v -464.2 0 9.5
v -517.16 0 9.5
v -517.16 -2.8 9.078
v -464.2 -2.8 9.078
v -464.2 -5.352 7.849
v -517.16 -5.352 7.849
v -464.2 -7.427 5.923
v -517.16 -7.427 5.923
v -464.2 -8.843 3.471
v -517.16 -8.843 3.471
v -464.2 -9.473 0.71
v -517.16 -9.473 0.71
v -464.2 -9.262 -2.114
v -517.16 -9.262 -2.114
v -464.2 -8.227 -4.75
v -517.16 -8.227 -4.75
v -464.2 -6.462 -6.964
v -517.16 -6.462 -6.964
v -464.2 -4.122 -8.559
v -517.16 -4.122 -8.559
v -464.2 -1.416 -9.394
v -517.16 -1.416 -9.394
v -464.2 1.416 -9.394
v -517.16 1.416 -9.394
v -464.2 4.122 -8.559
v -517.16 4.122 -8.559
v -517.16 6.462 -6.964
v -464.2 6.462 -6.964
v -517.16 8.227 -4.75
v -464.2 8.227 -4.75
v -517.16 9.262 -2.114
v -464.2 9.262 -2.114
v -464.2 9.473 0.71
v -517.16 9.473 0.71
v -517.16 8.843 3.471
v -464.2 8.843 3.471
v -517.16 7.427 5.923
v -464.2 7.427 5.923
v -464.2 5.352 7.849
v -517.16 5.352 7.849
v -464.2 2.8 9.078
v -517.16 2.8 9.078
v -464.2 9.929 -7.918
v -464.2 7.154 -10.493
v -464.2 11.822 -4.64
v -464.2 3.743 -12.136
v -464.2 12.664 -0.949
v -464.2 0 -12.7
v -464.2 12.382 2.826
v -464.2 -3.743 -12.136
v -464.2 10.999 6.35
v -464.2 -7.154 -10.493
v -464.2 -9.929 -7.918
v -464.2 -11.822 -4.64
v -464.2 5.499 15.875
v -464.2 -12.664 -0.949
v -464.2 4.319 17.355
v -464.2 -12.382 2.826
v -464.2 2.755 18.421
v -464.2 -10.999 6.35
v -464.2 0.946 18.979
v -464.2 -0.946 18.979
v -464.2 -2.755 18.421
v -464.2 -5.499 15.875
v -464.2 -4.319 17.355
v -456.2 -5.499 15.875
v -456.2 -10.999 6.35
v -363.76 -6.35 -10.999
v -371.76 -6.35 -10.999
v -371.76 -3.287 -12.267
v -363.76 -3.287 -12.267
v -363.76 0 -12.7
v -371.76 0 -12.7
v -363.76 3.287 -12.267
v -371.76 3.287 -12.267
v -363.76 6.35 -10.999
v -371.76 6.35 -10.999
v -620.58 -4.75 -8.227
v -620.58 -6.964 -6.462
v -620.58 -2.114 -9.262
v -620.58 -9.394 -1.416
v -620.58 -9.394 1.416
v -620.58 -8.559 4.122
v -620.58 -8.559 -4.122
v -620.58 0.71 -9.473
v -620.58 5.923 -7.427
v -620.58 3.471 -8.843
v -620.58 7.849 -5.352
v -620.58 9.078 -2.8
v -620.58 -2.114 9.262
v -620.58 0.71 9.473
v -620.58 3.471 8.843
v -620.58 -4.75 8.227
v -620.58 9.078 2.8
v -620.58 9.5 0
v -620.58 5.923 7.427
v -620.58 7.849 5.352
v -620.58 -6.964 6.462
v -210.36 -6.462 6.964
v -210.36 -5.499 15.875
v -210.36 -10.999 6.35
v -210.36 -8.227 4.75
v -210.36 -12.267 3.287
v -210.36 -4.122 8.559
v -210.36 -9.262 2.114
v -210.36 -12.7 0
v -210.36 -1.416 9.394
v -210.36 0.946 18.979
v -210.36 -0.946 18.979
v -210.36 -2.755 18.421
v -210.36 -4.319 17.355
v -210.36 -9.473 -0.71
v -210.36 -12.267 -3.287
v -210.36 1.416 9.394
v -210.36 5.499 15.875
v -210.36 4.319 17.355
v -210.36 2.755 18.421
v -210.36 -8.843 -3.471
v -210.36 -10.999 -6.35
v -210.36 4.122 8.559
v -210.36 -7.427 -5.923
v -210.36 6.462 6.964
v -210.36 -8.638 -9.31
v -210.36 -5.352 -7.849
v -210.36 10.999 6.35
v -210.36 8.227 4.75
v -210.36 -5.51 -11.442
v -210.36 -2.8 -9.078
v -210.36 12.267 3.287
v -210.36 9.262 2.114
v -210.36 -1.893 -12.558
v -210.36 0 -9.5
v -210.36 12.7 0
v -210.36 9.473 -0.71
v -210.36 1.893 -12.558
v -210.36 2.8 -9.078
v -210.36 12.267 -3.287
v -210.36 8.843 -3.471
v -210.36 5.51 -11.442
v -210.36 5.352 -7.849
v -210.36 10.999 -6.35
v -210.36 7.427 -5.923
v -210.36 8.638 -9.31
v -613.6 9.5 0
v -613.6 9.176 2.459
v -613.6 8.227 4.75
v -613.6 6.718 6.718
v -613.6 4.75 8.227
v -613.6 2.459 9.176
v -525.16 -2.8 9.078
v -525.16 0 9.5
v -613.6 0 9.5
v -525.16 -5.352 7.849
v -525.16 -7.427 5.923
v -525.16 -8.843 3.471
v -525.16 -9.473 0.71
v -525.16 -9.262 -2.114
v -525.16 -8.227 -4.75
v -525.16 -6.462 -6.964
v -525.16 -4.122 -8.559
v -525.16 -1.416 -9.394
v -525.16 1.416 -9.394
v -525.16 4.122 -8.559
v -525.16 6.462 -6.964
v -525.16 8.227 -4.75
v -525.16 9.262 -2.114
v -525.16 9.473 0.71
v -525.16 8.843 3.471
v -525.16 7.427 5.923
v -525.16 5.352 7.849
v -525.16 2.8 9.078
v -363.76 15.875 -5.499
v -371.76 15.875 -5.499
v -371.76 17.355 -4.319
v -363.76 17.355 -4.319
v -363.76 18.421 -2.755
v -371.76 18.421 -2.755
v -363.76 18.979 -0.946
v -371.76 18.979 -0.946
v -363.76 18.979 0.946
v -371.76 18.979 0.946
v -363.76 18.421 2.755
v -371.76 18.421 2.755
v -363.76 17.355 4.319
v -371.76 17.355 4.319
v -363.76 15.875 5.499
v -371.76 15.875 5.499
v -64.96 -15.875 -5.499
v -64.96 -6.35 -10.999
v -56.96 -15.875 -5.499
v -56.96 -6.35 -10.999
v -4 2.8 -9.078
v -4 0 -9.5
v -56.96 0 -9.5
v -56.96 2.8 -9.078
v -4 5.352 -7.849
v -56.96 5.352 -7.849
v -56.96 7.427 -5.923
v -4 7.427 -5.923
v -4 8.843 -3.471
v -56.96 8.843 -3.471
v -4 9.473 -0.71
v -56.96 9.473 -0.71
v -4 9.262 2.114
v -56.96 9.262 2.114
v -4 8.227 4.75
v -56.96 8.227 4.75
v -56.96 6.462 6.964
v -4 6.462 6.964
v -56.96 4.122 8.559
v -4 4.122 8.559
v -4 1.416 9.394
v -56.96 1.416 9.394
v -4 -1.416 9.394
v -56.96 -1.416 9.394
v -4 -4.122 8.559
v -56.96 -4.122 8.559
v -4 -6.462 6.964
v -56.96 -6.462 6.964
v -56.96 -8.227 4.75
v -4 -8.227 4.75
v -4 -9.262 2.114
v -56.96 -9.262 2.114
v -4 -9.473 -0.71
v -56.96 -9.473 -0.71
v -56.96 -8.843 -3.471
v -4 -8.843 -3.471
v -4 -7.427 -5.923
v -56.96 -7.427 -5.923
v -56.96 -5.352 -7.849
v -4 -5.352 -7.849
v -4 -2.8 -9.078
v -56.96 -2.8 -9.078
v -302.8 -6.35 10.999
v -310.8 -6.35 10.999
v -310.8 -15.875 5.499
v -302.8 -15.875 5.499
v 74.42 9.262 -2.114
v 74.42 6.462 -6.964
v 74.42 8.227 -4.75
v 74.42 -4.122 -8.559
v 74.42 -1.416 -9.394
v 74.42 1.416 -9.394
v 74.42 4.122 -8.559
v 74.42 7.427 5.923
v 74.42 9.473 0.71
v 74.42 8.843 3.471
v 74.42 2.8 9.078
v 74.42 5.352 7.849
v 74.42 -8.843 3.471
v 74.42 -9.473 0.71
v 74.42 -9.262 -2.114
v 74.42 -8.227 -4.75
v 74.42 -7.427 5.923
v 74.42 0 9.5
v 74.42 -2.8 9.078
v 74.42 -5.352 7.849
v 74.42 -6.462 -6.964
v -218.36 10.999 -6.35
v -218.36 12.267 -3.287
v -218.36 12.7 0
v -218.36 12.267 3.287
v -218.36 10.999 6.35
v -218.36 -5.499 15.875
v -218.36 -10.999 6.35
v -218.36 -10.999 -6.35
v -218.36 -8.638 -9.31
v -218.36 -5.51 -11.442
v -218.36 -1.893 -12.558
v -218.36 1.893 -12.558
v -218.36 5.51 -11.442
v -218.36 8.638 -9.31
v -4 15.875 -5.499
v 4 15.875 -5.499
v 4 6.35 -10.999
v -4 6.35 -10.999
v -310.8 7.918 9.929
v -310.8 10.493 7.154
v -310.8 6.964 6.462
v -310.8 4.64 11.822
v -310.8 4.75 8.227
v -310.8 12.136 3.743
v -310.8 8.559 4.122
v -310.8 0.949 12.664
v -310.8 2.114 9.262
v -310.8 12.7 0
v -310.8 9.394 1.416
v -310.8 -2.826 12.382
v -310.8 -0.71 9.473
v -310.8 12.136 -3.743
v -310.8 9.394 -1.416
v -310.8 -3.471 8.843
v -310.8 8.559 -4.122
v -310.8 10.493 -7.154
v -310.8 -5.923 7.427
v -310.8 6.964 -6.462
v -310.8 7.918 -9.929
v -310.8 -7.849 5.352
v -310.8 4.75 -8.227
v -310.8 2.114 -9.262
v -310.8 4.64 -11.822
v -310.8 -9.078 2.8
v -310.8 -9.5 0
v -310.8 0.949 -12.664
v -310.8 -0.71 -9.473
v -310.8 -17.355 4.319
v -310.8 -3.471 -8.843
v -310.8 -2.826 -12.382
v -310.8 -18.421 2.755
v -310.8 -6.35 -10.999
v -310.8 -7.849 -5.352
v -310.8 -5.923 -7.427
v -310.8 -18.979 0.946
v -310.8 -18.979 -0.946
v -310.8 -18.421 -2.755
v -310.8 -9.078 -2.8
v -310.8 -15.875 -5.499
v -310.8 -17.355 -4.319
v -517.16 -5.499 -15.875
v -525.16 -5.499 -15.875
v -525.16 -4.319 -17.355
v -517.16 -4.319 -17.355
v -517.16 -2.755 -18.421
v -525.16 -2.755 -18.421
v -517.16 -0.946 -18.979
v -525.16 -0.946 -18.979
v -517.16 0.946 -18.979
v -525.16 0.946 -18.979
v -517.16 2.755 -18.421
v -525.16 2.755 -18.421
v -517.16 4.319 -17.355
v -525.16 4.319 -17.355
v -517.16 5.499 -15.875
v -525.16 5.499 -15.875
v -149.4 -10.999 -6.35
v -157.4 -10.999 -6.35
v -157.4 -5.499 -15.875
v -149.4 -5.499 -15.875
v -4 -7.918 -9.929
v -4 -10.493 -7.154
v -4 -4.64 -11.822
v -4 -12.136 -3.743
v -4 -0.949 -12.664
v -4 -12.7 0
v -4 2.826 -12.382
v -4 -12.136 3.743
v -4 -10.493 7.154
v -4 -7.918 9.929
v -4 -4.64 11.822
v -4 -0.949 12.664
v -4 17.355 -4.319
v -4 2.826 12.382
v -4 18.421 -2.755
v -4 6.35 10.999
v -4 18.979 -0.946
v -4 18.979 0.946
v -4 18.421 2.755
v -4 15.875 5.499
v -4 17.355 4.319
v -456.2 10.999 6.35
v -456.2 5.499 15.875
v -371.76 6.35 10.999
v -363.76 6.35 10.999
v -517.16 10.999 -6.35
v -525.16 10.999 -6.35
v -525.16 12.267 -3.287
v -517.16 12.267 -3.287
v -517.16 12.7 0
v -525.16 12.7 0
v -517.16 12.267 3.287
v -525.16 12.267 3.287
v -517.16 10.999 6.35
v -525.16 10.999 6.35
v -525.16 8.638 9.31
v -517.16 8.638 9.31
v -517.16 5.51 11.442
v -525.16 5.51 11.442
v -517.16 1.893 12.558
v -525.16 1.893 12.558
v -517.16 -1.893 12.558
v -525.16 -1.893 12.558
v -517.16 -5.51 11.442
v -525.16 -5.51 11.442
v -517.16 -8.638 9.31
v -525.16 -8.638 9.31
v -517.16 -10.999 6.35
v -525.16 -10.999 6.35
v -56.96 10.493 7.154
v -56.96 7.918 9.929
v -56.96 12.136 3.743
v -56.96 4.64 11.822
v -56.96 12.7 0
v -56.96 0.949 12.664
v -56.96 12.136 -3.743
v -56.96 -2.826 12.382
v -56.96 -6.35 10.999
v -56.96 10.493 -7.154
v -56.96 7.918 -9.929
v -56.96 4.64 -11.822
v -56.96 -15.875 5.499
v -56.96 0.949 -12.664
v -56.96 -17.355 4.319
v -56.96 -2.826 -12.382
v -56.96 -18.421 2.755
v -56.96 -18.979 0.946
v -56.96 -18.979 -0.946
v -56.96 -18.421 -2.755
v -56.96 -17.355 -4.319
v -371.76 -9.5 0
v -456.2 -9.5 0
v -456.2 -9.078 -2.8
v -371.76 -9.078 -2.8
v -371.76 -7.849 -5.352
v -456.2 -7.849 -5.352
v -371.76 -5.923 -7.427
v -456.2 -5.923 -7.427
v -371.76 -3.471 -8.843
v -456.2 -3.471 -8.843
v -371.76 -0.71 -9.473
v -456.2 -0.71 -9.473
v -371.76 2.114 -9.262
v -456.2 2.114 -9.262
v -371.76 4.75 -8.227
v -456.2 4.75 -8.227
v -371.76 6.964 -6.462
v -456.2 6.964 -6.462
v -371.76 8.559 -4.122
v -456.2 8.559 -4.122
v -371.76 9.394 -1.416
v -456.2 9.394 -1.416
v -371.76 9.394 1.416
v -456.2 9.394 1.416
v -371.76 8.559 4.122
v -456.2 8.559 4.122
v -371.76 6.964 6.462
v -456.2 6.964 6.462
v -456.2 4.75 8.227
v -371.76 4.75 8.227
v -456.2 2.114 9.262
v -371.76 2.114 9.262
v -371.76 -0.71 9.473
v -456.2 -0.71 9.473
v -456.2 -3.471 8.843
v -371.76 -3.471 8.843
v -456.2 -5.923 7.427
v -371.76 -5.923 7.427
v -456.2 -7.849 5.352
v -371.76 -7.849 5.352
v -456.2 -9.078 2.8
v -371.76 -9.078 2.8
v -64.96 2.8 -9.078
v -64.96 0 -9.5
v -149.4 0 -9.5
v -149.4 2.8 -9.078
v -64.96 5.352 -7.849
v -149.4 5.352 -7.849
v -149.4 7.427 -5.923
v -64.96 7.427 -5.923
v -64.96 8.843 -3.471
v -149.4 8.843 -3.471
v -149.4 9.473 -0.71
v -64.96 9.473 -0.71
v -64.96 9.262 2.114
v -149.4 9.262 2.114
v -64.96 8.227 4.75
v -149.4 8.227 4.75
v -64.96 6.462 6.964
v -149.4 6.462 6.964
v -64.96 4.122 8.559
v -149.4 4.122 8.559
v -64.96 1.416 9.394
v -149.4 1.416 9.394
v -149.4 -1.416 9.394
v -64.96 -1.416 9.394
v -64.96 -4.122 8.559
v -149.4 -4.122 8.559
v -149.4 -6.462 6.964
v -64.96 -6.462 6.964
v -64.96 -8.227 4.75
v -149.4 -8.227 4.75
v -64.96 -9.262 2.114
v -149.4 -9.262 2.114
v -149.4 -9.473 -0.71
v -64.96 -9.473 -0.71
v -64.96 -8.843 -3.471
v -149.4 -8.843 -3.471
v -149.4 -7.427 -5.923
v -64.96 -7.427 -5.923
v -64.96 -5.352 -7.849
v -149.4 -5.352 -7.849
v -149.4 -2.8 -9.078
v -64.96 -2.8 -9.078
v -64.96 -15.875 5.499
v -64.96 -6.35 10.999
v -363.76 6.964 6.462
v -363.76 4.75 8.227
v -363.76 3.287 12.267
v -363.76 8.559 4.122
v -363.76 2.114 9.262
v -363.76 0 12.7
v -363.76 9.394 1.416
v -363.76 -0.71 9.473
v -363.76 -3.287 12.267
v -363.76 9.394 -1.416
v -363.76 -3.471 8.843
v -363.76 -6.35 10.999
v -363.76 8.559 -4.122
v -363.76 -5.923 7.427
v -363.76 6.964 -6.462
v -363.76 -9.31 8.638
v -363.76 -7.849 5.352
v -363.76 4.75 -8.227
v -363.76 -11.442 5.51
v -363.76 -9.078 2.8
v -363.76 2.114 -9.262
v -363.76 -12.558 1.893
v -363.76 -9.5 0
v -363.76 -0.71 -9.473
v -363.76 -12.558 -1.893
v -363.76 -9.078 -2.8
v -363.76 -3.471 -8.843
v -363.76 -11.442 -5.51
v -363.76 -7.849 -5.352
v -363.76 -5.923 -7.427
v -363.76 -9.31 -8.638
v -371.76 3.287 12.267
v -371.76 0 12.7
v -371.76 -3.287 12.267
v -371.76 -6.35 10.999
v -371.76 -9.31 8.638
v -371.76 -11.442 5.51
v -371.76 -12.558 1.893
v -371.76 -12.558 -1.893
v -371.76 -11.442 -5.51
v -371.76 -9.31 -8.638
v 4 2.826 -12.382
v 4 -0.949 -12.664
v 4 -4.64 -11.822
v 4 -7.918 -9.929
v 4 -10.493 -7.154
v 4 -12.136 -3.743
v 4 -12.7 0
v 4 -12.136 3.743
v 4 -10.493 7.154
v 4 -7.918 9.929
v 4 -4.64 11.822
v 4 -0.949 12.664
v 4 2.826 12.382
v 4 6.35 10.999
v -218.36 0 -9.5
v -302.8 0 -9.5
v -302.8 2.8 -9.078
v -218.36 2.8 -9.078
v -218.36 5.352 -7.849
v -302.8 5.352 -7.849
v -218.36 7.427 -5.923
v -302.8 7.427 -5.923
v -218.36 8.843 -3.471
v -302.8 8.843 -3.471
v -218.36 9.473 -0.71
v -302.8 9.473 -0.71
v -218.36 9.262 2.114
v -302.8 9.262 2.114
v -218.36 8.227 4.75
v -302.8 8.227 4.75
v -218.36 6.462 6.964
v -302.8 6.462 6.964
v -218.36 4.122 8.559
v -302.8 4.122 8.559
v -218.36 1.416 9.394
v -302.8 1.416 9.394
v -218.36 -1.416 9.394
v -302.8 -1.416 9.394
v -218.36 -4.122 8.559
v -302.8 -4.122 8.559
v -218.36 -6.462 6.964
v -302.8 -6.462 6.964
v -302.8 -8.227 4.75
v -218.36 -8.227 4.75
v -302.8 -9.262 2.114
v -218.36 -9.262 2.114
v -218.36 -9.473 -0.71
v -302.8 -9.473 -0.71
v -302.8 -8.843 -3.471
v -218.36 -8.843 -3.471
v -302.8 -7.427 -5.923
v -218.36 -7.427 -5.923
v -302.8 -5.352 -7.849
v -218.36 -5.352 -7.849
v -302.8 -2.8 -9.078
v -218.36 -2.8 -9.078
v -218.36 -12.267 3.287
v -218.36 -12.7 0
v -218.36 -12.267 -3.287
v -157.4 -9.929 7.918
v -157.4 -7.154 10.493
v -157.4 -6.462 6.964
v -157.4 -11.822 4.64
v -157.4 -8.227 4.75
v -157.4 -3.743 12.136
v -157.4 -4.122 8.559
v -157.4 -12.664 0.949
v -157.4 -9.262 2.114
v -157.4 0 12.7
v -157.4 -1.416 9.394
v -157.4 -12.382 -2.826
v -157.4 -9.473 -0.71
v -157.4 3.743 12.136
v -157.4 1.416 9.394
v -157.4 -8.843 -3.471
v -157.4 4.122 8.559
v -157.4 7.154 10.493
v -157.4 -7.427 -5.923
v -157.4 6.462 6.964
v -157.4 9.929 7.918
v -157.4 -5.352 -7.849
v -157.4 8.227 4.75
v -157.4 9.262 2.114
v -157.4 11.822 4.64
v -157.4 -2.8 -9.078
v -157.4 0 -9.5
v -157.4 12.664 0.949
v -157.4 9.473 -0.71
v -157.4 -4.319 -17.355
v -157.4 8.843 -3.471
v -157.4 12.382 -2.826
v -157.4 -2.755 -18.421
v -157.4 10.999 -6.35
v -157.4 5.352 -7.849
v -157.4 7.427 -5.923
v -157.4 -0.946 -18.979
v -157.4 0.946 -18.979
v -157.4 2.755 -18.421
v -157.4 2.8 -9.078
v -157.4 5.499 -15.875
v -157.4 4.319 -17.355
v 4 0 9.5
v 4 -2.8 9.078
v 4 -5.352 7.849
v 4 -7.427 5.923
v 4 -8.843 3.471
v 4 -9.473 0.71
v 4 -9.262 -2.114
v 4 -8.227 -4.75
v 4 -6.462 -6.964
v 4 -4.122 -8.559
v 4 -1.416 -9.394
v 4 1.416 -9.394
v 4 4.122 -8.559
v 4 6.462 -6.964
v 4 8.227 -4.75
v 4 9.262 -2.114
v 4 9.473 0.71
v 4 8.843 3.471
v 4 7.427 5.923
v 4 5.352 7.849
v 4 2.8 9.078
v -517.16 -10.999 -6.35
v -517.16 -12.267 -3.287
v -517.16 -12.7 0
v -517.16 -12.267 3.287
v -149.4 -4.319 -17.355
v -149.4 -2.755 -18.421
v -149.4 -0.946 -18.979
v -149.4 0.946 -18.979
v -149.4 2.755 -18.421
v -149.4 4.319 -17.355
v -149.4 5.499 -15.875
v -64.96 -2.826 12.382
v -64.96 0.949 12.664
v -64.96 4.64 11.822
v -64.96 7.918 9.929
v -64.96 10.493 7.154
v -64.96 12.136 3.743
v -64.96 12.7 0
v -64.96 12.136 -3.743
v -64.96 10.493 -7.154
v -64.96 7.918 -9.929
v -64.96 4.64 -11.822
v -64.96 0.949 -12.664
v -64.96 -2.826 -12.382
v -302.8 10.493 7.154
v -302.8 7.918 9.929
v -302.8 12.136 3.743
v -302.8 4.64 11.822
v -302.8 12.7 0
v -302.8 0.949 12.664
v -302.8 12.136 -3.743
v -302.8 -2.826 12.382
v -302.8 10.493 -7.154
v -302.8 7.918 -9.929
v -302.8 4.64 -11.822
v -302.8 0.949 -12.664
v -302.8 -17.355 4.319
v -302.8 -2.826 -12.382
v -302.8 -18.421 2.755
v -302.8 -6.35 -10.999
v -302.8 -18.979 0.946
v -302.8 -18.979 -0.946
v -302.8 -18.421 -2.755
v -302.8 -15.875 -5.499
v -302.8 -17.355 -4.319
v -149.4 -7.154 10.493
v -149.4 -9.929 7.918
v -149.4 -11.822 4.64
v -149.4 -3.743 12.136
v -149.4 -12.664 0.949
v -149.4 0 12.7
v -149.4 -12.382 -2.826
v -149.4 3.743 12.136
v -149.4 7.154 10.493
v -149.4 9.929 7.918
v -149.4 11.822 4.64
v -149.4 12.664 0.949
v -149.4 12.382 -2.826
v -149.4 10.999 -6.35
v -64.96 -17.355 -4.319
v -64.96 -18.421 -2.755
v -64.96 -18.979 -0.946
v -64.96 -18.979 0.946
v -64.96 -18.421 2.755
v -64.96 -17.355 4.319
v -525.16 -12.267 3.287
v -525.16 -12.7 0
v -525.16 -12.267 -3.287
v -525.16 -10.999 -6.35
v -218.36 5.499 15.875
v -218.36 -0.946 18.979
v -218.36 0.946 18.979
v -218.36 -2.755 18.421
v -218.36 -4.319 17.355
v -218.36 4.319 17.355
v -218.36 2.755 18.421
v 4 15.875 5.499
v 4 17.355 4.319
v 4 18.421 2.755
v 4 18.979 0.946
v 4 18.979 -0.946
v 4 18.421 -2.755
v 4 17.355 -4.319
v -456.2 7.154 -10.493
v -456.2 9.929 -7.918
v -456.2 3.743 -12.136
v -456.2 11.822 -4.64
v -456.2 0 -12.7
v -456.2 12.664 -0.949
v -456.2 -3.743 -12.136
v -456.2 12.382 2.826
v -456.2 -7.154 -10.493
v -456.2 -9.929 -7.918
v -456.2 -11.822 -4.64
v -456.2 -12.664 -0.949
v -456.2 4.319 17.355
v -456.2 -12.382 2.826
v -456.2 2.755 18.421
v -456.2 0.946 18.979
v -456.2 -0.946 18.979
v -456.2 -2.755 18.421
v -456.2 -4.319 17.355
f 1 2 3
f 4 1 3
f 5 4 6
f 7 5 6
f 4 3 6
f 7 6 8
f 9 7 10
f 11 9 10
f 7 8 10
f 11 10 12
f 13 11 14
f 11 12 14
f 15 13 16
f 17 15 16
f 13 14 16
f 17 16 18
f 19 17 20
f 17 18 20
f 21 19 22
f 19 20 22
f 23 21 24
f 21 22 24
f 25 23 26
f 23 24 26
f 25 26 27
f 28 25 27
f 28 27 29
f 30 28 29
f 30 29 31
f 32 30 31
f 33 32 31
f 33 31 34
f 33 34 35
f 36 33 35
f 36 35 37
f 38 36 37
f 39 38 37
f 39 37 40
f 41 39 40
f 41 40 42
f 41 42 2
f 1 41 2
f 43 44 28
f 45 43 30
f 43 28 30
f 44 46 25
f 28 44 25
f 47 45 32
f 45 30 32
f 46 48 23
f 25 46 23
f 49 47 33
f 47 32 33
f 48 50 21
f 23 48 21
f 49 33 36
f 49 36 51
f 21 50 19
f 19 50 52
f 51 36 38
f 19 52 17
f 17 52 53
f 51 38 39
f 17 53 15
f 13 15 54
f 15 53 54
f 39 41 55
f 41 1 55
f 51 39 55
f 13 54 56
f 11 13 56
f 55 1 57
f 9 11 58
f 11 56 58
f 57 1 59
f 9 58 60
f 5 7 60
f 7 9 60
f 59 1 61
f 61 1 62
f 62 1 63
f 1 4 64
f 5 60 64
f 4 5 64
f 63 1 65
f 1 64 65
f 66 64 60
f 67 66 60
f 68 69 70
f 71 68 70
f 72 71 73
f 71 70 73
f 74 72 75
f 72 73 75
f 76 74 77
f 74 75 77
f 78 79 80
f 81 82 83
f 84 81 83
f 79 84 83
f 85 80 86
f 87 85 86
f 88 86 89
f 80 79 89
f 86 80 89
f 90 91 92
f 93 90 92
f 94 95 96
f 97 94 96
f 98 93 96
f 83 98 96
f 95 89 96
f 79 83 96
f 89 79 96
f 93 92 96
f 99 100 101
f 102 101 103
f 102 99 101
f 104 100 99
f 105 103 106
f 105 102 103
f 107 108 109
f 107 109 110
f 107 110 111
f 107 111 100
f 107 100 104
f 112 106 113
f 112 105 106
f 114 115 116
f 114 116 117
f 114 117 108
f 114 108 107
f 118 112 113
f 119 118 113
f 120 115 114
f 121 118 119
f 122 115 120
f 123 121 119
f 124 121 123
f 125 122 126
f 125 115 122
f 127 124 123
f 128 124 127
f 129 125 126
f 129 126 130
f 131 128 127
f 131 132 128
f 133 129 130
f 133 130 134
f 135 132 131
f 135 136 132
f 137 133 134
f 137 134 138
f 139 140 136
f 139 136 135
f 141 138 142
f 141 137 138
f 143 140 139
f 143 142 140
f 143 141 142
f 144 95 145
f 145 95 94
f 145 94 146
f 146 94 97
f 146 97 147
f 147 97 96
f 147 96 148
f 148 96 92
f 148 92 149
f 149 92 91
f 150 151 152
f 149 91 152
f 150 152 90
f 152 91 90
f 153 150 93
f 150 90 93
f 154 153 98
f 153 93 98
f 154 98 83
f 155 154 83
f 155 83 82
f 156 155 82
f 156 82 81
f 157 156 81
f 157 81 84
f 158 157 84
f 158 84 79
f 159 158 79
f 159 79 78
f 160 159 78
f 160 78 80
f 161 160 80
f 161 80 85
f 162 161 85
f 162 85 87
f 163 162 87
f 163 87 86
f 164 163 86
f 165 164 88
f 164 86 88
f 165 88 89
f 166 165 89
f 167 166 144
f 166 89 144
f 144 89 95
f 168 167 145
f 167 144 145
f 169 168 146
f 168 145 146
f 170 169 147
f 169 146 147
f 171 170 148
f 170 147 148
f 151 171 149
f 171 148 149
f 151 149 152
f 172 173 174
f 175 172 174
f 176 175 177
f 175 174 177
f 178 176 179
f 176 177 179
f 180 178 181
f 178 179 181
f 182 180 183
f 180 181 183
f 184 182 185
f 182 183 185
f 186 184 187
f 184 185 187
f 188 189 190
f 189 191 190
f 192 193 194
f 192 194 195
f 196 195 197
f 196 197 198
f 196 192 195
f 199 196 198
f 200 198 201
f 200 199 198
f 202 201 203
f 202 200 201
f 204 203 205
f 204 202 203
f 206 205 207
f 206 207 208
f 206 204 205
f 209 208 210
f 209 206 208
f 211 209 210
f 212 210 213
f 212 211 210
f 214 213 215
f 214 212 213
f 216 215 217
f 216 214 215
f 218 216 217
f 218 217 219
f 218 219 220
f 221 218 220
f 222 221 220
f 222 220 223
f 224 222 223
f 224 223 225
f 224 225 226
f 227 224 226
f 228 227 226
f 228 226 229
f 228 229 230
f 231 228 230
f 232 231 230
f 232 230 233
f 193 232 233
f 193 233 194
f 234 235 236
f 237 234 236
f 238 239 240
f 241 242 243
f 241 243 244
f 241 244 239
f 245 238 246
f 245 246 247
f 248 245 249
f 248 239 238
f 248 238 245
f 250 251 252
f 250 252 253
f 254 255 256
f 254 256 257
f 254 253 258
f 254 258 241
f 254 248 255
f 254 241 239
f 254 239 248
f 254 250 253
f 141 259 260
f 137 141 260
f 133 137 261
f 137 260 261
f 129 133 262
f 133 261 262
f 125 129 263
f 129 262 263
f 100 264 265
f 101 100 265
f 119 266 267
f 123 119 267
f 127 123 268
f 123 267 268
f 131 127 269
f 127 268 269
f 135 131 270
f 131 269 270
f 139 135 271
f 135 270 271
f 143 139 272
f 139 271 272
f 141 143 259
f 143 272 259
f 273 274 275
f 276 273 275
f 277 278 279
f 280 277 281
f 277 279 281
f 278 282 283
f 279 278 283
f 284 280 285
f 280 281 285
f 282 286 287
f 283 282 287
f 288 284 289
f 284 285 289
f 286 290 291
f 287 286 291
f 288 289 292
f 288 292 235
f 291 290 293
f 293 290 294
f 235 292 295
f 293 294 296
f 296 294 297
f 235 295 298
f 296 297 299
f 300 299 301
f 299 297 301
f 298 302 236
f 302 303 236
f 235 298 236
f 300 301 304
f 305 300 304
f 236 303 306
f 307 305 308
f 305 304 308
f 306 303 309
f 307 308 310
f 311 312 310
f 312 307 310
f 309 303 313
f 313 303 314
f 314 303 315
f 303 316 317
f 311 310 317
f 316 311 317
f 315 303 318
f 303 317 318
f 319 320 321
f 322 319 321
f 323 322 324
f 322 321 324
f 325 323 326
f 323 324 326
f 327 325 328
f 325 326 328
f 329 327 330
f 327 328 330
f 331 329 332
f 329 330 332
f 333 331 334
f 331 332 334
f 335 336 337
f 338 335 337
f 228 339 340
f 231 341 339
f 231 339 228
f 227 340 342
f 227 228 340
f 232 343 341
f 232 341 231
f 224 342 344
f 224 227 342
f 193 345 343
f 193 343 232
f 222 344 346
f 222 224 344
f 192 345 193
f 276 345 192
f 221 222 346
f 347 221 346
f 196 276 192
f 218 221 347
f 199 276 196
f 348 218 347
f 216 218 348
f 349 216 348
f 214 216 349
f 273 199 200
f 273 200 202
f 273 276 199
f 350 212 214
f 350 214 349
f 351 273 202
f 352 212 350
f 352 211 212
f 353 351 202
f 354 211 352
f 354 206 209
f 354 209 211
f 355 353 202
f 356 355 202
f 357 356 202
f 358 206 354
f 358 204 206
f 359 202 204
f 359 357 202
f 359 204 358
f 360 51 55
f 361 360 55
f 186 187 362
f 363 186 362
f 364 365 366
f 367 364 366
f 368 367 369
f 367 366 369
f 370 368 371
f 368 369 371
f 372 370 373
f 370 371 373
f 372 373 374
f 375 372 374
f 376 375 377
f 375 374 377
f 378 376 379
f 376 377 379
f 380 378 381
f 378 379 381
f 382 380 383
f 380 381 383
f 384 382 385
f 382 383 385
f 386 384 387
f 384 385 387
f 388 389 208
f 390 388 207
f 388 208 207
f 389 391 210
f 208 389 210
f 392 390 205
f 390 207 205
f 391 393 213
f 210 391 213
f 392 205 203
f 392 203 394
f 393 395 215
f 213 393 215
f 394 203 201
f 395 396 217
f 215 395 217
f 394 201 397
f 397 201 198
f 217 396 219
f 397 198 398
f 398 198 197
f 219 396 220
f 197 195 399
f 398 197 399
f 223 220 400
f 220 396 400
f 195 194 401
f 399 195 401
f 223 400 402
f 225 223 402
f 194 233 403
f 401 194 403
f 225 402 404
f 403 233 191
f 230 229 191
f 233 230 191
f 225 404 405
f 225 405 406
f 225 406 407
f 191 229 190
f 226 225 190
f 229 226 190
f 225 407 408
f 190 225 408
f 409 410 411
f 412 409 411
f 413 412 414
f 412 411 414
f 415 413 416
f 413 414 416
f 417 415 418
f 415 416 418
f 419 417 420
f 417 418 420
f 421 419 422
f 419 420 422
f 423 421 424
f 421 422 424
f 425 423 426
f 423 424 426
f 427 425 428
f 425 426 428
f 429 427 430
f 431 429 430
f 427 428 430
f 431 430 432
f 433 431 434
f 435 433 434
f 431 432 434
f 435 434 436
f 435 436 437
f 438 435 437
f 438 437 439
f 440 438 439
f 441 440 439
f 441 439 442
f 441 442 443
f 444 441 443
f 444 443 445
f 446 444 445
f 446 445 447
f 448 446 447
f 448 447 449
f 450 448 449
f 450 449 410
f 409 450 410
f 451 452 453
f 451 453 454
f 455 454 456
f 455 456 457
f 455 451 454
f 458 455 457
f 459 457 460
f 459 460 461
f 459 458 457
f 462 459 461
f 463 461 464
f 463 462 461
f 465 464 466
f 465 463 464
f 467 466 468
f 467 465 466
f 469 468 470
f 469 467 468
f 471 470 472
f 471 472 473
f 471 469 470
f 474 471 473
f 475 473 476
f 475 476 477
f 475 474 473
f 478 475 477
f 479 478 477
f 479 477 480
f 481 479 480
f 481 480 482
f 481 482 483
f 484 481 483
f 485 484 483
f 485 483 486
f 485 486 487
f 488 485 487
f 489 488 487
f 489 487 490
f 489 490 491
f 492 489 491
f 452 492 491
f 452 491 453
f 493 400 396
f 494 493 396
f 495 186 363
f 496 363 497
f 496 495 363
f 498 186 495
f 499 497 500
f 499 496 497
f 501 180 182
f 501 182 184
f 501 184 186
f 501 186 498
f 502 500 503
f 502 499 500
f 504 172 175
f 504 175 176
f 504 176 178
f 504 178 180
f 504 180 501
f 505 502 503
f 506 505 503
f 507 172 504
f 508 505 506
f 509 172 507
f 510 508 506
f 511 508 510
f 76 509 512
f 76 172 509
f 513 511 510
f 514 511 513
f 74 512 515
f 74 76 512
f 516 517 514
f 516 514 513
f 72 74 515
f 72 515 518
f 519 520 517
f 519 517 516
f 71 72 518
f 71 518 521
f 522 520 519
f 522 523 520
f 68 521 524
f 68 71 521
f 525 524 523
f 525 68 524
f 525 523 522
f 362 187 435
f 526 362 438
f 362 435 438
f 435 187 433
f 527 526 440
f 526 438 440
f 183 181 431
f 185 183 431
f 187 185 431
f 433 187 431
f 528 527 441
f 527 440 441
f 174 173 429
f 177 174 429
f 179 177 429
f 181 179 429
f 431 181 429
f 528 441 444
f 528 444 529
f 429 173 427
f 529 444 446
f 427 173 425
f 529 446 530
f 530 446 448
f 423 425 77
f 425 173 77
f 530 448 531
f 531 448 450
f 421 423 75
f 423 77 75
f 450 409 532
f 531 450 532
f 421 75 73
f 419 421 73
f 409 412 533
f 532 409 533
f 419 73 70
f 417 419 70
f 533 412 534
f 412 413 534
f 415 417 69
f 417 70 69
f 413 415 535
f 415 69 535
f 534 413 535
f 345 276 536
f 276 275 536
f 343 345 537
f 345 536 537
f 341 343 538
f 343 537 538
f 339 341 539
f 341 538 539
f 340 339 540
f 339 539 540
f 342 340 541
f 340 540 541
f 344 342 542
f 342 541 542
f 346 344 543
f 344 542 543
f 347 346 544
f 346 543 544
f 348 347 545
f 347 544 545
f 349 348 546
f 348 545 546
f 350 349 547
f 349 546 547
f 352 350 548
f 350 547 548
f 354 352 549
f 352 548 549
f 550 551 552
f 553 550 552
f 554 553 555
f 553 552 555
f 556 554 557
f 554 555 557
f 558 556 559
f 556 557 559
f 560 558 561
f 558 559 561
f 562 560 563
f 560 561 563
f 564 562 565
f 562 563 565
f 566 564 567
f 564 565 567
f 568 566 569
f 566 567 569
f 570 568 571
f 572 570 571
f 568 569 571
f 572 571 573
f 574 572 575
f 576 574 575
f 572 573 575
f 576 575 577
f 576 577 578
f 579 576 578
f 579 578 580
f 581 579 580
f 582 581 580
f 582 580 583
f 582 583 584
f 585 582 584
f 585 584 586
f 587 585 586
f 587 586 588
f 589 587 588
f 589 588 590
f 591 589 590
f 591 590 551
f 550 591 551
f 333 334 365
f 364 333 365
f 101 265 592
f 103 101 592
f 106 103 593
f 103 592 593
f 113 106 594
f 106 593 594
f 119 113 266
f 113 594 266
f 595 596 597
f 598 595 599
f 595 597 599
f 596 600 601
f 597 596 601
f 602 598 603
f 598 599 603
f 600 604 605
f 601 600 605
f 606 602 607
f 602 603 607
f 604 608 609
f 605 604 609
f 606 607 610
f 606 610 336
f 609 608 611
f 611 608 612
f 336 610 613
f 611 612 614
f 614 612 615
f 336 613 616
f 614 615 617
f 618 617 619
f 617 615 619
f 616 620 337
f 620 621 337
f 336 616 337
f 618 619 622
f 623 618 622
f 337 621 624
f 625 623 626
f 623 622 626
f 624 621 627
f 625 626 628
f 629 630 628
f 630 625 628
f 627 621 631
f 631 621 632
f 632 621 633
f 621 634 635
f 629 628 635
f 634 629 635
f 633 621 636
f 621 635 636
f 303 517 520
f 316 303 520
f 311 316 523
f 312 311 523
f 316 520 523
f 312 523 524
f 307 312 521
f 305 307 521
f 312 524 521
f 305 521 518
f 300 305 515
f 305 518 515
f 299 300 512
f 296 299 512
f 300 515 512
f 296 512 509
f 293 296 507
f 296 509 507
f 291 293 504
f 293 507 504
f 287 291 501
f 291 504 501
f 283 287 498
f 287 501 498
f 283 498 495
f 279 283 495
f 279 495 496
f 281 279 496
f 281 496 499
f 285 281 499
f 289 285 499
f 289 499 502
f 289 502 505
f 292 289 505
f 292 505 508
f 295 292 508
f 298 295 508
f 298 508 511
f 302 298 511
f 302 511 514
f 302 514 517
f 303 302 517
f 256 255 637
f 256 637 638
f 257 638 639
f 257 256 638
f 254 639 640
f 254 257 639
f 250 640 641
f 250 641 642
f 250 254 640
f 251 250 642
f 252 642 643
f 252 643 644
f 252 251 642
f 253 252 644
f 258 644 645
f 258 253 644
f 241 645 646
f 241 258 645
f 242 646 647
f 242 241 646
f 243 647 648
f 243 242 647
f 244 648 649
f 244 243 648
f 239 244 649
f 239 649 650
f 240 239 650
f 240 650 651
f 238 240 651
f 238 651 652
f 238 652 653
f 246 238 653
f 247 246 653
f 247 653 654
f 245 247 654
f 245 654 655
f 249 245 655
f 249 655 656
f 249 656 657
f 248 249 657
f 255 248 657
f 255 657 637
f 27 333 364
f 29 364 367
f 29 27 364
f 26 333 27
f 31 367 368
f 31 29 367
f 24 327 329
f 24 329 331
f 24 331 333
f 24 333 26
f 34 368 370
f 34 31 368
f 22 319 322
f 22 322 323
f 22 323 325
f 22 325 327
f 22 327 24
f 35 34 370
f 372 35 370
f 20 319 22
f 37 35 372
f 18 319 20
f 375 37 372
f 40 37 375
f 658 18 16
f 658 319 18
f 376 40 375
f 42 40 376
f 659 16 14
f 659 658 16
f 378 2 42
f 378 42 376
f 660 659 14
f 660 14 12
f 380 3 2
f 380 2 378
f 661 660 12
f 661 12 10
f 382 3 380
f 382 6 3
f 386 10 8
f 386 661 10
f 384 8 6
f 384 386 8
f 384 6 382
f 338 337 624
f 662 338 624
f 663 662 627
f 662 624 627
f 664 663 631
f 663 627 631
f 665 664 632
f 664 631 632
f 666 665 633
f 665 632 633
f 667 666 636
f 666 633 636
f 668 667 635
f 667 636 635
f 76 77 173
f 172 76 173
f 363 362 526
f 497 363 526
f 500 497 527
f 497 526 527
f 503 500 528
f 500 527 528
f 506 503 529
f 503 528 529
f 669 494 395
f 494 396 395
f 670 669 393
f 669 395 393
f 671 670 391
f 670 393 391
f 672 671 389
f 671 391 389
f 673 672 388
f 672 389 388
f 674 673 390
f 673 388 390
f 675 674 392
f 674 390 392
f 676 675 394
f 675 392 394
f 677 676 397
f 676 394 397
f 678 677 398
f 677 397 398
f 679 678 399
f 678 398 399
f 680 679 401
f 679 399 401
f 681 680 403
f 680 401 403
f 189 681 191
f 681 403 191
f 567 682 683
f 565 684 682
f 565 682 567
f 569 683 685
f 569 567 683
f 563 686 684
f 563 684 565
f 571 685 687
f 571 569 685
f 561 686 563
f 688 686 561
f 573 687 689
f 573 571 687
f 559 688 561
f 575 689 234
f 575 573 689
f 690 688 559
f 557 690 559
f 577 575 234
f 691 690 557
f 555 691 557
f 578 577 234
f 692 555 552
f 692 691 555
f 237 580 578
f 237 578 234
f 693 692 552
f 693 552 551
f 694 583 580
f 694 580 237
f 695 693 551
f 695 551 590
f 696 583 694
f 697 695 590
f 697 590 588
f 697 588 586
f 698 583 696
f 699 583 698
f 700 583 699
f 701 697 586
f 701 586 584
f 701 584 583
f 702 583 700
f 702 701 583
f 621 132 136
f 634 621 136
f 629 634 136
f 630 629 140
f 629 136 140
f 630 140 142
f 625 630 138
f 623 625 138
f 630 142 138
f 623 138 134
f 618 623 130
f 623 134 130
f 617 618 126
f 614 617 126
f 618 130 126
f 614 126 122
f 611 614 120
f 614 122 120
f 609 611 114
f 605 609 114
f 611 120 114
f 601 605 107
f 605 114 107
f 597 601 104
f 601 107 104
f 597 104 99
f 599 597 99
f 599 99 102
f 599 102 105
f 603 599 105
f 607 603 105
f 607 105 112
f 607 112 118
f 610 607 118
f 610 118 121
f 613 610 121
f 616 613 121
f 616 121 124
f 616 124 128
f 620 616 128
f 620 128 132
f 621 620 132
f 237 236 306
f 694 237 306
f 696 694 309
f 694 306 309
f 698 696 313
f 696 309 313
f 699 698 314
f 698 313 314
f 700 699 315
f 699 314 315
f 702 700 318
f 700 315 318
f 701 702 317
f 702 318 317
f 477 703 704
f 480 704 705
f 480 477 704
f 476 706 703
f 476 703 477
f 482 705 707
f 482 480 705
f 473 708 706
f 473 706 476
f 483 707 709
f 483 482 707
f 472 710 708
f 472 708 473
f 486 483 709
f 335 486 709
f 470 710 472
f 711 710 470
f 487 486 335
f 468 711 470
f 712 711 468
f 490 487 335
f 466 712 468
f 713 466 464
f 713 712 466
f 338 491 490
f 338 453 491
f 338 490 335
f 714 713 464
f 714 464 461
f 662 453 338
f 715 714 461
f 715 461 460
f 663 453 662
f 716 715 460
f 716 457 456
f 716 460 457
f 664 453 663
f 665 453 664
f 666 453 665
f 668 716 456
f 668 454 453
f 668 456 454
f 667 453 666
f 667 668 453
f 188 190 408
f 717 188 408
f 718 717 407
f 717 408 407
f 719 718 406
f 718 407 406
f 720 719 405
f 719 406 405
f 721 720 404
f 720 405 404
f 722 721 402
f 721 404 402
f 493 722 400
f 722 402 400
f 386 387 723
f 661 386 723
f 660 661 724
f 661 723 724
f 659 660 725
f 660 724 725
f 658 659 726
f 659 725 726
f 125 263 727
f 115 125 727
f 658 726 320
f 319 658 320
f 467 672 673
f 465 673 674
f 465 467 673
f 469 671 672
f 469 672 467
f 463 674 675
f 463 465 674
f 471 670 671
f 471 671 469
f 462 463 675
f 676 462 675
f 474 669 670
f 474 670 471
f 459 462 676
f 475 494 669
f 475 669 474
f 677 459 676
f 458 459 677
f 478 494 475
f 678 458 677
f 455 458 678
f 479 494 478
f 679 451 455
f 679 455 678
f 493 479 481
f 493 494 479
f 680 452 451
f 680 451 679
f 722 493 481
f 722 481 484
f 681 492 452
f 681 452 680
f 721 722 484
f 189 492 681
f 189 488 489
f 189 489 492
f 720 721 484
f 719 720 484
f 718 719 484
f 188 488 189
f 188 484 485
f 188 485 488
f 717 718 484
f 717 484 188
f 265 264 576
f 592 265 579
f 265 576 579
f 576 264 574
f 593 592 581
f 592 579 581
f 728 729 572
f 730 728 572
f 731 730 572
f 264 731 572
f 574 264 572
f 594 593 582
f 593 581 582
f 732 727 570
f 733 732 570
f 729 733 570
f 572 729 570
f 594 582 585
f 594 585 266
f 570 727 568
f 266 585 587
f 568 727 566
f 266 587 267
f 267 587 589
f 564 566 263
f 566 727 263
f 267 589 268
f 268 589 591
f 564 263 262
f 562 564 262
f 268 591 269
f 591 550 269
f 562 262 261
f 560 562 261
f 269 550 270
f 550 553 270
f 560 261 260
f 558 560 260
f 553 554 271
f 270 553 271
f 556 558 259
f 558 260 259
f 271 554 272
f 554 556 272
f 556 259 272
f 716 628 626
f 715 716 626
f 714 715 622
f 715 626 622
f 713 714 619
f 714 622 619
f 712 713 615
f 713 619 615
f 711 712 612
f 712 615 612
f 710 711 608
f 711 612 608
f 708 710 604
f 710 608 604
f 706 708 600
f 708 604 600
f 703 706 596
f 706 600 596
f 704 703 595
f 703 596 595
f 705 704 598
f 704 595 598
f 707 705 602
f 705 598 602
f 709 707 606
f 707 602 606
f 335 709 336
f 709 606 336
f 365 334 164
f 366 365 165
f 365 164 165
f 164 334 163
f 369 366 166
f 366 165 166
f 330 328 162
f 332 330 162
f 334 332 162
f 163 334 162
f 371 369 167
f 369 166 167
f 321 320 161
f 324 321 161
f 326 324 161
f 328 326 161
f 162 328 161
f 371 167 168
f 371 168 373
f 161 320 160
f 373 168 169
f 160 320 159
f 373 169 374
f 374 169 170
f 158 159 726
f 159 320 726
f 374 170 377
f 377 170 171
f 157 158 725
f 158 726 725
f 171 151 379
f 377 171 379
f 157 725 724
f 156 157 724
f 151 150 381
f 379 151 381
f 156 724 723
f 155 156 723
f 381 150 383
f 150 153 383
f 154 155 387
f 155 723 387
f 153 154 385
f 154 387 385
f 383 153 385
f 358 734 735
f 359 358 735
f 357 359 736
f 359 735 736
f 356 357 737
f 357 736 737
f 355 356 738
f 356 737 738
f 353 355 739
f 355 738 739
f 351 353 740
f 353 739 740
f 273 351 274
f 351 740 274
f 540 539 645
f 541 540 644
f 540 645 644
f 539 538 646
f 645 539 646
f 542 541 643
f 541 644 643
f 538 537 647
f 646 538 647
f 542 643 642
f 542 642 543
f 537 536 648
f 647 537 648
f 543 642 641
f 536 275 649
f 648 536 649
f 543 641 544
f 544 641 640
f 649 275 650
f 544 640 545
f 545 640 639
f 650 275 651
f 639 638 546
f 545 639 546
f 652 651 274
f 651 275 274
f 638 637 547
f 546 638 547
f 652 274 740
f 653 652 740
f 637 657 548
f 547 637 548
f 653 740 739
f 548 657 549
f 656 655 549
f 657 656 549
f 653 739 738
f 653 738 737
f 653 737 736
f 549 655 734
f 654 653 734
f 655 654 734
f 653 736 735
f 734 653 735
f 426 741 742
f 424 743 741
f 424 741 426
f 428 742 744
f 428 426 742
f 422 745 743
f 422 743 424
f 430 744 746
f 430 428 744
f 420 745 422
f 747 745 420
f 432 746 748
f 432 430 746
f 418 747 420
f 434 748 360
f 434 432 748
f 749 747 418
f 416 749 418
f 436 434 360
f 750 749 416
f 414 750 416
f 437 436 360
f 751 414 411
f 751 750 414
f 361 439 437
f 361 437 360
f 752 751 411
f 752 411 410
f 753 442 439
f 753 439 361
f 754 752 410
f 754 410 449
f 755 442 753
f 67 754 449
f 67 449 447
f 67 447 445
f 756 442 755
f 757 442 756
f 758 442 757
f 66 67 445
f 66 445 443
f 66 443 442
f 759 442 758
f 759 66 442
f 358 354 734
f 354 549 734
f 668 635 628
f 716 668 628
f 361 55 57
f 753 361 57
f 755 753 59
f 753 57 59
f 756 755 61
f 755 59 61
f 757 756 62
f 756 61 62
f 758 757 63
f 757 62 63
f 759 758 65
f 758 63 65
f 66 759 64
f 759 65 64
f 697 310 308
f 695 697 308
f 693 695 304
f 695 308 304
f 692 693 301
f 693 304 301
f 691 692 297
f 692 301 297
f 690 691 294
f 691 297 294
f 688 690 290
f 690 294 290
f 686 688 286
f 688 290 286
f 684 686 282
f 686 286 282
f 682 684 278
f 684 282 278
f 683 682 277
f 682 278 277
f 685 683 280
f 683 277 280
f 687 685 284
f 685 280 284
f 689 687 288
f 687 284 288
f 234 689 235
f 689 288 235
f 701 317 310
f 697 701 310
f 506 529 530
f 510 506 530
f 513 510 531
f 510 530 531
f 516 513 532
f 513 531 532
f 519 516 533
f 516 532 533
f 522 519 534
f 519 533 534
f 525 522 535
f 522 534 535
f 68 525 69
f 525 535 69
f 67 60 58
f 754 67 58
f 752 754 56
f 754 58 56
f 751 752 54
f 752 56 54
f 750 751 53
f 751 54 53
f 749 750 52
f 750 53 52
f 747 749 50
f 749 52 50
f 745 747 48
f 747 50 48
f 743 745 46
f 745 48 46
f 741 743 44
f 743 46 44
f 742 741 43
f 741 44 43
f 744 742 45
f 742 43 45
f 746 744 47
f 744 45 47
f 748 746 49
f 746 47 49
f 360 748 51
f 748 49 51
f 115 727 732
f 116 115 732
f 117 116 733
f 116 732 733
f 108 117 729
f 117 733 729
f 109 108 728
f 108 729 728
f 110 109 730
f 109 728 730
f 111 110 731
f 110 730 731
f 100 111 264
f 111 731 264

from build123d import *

# Parameters (mm, degrees)
BOSS_EXTRUDE1_DEPTH         = 4
BODY_MOVE_COPY2_ANGLE       = 180
SKETCH2_R                   = 9.5
BOSS_EXTRUDE2_DEPTH         = 153.4
BODY_MOVE_COPY3_START       = -613.6
BODY_MOVE_COPY3_OUTLINE_R   = 9.5
BODY_MOVE_COPY3_DEPTH       = 157.4
BODY_MOVE_COPY3_START_2     = -525.16
BODY_MOVE_COPY3_2_OUTLINE_R = 9.5
BODY_MOVE_COPY3_2_DEPTH     = 8
BODY_MOVE_COPY3_START_3     = -464.2
BODY_MOVE_COPY3_3_OUTLINE_R = 9.5
BODY_MOVE_COPY3_3_DEPTH     = 8
BODY_MOVE_COPY3_START_4     = -460.2
BODY_MOVE_COPY3_4_OUTLINE_R = 9.5
BODY_MOVE_COPY3_4_DEPTH     = 157.4
BODY_MOVE_COPY3_START_5     = -371.76
BODY_MOVE_COPY3_5_OUTLINE_R = 9.5
BODY_MOVE_COPY3_5_DEPTH     = 8
BODY_MOVE_COPY3_START_6     = -310.8
BODY_MOVE_COPY3_6_OUTLINE_R = 9.5
BODY_MOVE_COPY3_6_DEPTH     = 8
BODY_MOVE_COPY3_START_7     = -306.8
BODY_MOVE_COPY3_7_OUTLINE_R = 9.5
BODY_MOVE_COPY3_7_DEPTH     = 157.4
BODY_MOVE_COPY3_START_8     = -218.36
BODY_MOVE_COPY3_8_OUTLINE_R = 9.5
BODY_MOVE_COPY3_8_DEPTH     = 8
BODY_MOVE_COPY3_START_9     = -157.4
BODY_MOVE_COPY3_9_OUTLINE_R = 9.5
BODY_MOVE_COPY3_9_DEPTH     = 8
BODY_MOVE_COPY4_ANGLE       = 90
BODY_MOVE_COPY5_ANGLE       = 180
BODY_MOVE_COPY6_ANGLE       = 90
BOSS_EXTRUDE3_START         = 74.42
SKETCH2_2_R                 = 9.5
BOSS_EXTRUDE3_DEPTH         = 74.42
BOSS_EXTRUDE4_START         = -620.58
SKETCH2_3_R                 = 9.5
BOSS_EXTRUDE4_DEPTH         = 6.98


# Read off the part's stored shape, not the designer's step: Body-Move/Copy3
with BuildPart() as part:
    # Sketch1 → Boss-Extrude1 (new, symmetric)
    with BuildSketch(Plane(origin=(0, 0, 0), x_dir=(0, 0, -1), z_dir=(1, 0, 0))):
        with BuildLine():
            Line((5.499261314, 15.875), (10.998522628, 6.35))
            ThreePointArc((10.998522628, 6.35), (0, -12.7), (-10.998522628, 6.35))
            Line((-10.998522628, 6.35), (-5.499261314, 15.875))
            ThreePointArc((-5.499261314, 15.875), (0, 19.05), (5.499261314, 15.875))
        make_face()
    extrude(amount=BOSS_EXTRUDE1_DEPTH, both=True)


with BuildPart() as body_2:
    # Body-Move/Copy1: copy of part
    add(part.part.moved(Location((-60.96, 0, 0))))


with BuildPart() as body_2_1:
    # Body-Move/Copy2: moved
    add(body_2.part.rotate(Axis((0, 0, 0), (1, 0, 0)), BODY_MOVE_COPY2_ANGLE))


with BuildPart() as part_1:
    add(part.part)

    add(body_2_1.part)  # Boss-Extrude2 merges body 2
    # Sketch2 → Boss-Extrude2 (add)
    with BuildSketch(Plane(origin=(0, 0, 0), x_dir=(0, 0, -1), z_dir=(1, 0, 0))):
        Circle(SKETCH2_R)
    extrude(amount=-BOSS_EXTRUDE2_DEPTH)

    # Sketch2<2> → Boss-Extrude3 (add)
    with BuildSketch(Plane(origin=(0, 0, 0), x_dir=(0, 0, -1), z_dir=(1, 0, 0)).offset(BOSS_EXTRUDE3_START)):
        with Locations(Location((0, 0, 0), (0, 0, 180))):
            Circle(SKETCH2_2_R)
    extrude(amount=-BOSS_EXTRUDE3_DEPTH)


with BuildPart() as body_2_2:
    # Body-Move/Copy3 outline → Body-Move/Copy3 (new body)
    with BuildSketch(Plane.YZ.offset(BODY_MOVE_COPY3_START)):
        Circle(BODY_MOVE_COPY3_OUTLINE_R)
    extrude(amount=BODY_MOVE_COPY3_DEPTH)

    # Body-Move_Copy3 2 outline → Body-Move_Copy3 2 (add)
    with BuildSketch(Plane.YZ.offset(BODY_MOVE_COPY3_START_2)):
        with BuildLine():
            ThreePointArc((6.35, -10.998522628), (12.7, 0), (6.35, 10.998522628))
            ThreePointArc((6.35, 10.998522628), (0, 12.7), (-6.35, 10.998522628))
            Line((-6.35, 10.998522628), (-15.875, 5.499261314))
            ThreePointArc((-15.875, 5.499261314), (-19.05, 0), (-15.875, -5.499261314))
            Line((-15.875, -5.499261314), (-6.35, -10.998522628))
            ThreePointArc((-6.35, -10.998522628), (0, -12.7), (6.35, -10.998522628))
        make_face()
        Circle(BODY_MOVE_COPY3_2_OUTLINE_R, mode=Mode.SUBTRACT)
    extrude(amount=BODY_MOVE_COPY3_2_DEPTH)

    # Body-Move_Copy3 3 outline → Body-Move_Copy3 3 (add)
    with BuildSketch(Plane.YZ.offset(BODY_MOVE_COPY3_START_3)):
        with BuildLine():
            ThreePointArc((15.875, -5.499261314), (19.05, 0), (15.875, 5.499261314))
            Line((15.875, 5.499261314), (6.35, 10.998522628))
            ThreePointArc((6.35, 10.998522628), (-12.7, 0), (6.35, -10.998522628))
            Line((6.35, -10.998522628), (15.875, -5.499261314))
        make_face()
        Circle(BODY_MOVE_COPY3_3_OUTLINE_R, mode=Mode.SUBTRACT)
    extrude(amount=BODY_MOVE_COPY3_3_DEPTH)


with BuildPart() as body_3:
    # Body-Move_Copy3 4 outline → Body-Move_Copy3 4 (new body)
    with BuildSketch(Plane.YZ.offset(BODY_MOVE_COPY3_START_4)):
        Circle(BODY_MOVE_COPY3_4_OUTLINE_R)
    extrude(amount=BODY_MOVE_COPY3_4_DEPTH)

    # Body-Move_Copy3 5 outline → Body-Move_Copy3 5 (add)
    with BuildSketch(Plane.YZ.offset(BODY_MOVE_COPY3_START_5)):
        with BuildLine():
            ThreePointArc((6.35, -10.998522628), (12.7, 0), (6.35, 10.998522628))
            ThreePointArc((6.35, 10.998522628), (0, 12.7), (-6.35, 10.998522628))
            Line((-6.35, 10.998522628), (-15.875, 5.499261314))
            ThreePointArc((-15.875, 5.499261314), (-19.05, 0), (-15.875, -5.499261314))
            Line((-15.875, -5.499261314), (-6.35, -10.998522628))
            ThreePointArc((-6.35, -10.998522628), (0, -12.7), (6.35, -10.998522628))
        make_face()
        Circle(BODY_MOVE_COPY3_5_OUTLINE_R, mode=Mode.SUBTRACT)
    extrude(amount=BODY_MOVE_COPY3_5_DEPTH)

    # Body-Move_Copy3 6 outline → Body-Move_Copy3 6 (add)
    with BuildSketch(Plane.YZ.offset(BODY_MOVE_COPY3_START_6)):
        with BuildLine():
            ThreePointArc((15.875, -5.499261314), (19.05, 0), (15.875, 5.499261314))
            Line((15.875, 5.499261314), (6.35, 10.998522628))
            ThreePointArc((6.35, 10.998522628), (-12.7, 0), (6.35, -10.998522628))
            Line((6.35, -10.998522628), (15.875, -5.499261314))
        make_face()
        Circle(BODY_MOVE_COPY3_6_OUTLINE_R, mode=Mode.SUBTRACT)
    extrude(amount=BODY_MOVE_COPY3_6_DEPTH)


with BuildPart() as body_4:
    # Body-Move_Copy3 7 outline → Body-Move_Copy3 7 (new body)
    with BuildSketch(Plane.YZ.offset(BODY_MOVE_COPY3_START_7)):
        Circle(BODY_MOVE_COPY3_7_OUTLINE_R)
    extrude(amount=BODY_MOVE_COPY3_7_DEPTH)

    # Body-Move_Copy3 8 outline → Body-Move_Copy3 8 (add)
    with BuildSketch(Plane.YZ.offset(BODY_MOVE_COPY3_START_8)):
        with BuildLine():
            ThreePointArc((6.35, -10.998522628), (12.7, 0), (6.35, 10.998522628))
            ThreePointArc((6.35, 10.998522628), (0, 12.7), (-6.35, 10.998522628))
            Line((-6.35, 10.998522628), (-15.875, 5.499261314))
            ThreePointArc((-15.875, 5.499261314), (-19.05, 0), (-15.875, -5.499261314))
            Line((-15.875, -5.499261314), (-6.35, -10.998522628))
            ThreePointArc((-6.35, -10.998522628), (0, -12.7), (6.35, -10.998522628))
        make_face()
        Circle(BODY_MOVE_COPY3_8_OUTLINE_R, mode=Mode.SUBTRACT)
    extrude(amount=BODY_MOVE_COPY3_8_DEPTH)

    # Body-Move_Copy3 9 outline → Body-Move_Copy3 9 (add)
    with BuildSketch(Plane.YZ.offset(BODY_MOVE_COPY3_START_9)):
        with BuildLine():
            ThreePointArc((15.875, -5.499261314), (19.05, 0), (15.875, 5.499261314))
            Line((15.875, 5.499261314), (6.35, 10.998522628))
            ThreePointArc((6.35, 10.998522628), (-12.7, 0), (6.35, -10.998522628))
            Line((6.35, -10.998522628), (15.875, -5.499261314))
        make_face()
        Circle(BODY_MOVE_COPY3_9_OUTLINE_R, mode=Mode.SUBTRACT)
    extrude(amount=BODY_MOVE_COPY3_9_DEPTH)


with BuildPart() as body_4_1:
    # Body-Move/Copy4: moved
    add(body_4.part.rotate(Axis((0, 0, 0), (-1, 0, 0)), BODY_MOVE_COPY4_ANGLE))


with BuildPart() as body_3_1:
    # Body-Move/Copy5: moved
    add(body_3.part.rotate(Axis((0, 0, 0), (1, 0, 0)), BODY_MOVE_COPY5_ANGLE))


with BuildPart() as body_2_2_1:
    # Body-Move/Copy6: moved
    add(body_2_2.part.rotate(Axis((0, 0, 0), (1, 0, 0)), BODY_MOVE_COPY6_ANGLE))

    # Combine1: union part, body 4, body 3
    add(part_1.part)
    add(body_4_1.part)
    add(body_3_1.part)

    # Sketch2<3> → Boss-Extrude4 (add)
    with BuildSketch(Plane(origin=(0, 0, 0), x_dir=(0, 0, -1), z_dir=(1, 0, 0)).offset(BOSS_EXTRUDE4_START)):
        with Locations(Location((0, 0, 0), (0, 0, 90))):
            Circle(SKETCH2_3_R)
    extrude(amount=BOSS_EXTRUDE4_DEPTH)


solid = body_2_2_1.part
